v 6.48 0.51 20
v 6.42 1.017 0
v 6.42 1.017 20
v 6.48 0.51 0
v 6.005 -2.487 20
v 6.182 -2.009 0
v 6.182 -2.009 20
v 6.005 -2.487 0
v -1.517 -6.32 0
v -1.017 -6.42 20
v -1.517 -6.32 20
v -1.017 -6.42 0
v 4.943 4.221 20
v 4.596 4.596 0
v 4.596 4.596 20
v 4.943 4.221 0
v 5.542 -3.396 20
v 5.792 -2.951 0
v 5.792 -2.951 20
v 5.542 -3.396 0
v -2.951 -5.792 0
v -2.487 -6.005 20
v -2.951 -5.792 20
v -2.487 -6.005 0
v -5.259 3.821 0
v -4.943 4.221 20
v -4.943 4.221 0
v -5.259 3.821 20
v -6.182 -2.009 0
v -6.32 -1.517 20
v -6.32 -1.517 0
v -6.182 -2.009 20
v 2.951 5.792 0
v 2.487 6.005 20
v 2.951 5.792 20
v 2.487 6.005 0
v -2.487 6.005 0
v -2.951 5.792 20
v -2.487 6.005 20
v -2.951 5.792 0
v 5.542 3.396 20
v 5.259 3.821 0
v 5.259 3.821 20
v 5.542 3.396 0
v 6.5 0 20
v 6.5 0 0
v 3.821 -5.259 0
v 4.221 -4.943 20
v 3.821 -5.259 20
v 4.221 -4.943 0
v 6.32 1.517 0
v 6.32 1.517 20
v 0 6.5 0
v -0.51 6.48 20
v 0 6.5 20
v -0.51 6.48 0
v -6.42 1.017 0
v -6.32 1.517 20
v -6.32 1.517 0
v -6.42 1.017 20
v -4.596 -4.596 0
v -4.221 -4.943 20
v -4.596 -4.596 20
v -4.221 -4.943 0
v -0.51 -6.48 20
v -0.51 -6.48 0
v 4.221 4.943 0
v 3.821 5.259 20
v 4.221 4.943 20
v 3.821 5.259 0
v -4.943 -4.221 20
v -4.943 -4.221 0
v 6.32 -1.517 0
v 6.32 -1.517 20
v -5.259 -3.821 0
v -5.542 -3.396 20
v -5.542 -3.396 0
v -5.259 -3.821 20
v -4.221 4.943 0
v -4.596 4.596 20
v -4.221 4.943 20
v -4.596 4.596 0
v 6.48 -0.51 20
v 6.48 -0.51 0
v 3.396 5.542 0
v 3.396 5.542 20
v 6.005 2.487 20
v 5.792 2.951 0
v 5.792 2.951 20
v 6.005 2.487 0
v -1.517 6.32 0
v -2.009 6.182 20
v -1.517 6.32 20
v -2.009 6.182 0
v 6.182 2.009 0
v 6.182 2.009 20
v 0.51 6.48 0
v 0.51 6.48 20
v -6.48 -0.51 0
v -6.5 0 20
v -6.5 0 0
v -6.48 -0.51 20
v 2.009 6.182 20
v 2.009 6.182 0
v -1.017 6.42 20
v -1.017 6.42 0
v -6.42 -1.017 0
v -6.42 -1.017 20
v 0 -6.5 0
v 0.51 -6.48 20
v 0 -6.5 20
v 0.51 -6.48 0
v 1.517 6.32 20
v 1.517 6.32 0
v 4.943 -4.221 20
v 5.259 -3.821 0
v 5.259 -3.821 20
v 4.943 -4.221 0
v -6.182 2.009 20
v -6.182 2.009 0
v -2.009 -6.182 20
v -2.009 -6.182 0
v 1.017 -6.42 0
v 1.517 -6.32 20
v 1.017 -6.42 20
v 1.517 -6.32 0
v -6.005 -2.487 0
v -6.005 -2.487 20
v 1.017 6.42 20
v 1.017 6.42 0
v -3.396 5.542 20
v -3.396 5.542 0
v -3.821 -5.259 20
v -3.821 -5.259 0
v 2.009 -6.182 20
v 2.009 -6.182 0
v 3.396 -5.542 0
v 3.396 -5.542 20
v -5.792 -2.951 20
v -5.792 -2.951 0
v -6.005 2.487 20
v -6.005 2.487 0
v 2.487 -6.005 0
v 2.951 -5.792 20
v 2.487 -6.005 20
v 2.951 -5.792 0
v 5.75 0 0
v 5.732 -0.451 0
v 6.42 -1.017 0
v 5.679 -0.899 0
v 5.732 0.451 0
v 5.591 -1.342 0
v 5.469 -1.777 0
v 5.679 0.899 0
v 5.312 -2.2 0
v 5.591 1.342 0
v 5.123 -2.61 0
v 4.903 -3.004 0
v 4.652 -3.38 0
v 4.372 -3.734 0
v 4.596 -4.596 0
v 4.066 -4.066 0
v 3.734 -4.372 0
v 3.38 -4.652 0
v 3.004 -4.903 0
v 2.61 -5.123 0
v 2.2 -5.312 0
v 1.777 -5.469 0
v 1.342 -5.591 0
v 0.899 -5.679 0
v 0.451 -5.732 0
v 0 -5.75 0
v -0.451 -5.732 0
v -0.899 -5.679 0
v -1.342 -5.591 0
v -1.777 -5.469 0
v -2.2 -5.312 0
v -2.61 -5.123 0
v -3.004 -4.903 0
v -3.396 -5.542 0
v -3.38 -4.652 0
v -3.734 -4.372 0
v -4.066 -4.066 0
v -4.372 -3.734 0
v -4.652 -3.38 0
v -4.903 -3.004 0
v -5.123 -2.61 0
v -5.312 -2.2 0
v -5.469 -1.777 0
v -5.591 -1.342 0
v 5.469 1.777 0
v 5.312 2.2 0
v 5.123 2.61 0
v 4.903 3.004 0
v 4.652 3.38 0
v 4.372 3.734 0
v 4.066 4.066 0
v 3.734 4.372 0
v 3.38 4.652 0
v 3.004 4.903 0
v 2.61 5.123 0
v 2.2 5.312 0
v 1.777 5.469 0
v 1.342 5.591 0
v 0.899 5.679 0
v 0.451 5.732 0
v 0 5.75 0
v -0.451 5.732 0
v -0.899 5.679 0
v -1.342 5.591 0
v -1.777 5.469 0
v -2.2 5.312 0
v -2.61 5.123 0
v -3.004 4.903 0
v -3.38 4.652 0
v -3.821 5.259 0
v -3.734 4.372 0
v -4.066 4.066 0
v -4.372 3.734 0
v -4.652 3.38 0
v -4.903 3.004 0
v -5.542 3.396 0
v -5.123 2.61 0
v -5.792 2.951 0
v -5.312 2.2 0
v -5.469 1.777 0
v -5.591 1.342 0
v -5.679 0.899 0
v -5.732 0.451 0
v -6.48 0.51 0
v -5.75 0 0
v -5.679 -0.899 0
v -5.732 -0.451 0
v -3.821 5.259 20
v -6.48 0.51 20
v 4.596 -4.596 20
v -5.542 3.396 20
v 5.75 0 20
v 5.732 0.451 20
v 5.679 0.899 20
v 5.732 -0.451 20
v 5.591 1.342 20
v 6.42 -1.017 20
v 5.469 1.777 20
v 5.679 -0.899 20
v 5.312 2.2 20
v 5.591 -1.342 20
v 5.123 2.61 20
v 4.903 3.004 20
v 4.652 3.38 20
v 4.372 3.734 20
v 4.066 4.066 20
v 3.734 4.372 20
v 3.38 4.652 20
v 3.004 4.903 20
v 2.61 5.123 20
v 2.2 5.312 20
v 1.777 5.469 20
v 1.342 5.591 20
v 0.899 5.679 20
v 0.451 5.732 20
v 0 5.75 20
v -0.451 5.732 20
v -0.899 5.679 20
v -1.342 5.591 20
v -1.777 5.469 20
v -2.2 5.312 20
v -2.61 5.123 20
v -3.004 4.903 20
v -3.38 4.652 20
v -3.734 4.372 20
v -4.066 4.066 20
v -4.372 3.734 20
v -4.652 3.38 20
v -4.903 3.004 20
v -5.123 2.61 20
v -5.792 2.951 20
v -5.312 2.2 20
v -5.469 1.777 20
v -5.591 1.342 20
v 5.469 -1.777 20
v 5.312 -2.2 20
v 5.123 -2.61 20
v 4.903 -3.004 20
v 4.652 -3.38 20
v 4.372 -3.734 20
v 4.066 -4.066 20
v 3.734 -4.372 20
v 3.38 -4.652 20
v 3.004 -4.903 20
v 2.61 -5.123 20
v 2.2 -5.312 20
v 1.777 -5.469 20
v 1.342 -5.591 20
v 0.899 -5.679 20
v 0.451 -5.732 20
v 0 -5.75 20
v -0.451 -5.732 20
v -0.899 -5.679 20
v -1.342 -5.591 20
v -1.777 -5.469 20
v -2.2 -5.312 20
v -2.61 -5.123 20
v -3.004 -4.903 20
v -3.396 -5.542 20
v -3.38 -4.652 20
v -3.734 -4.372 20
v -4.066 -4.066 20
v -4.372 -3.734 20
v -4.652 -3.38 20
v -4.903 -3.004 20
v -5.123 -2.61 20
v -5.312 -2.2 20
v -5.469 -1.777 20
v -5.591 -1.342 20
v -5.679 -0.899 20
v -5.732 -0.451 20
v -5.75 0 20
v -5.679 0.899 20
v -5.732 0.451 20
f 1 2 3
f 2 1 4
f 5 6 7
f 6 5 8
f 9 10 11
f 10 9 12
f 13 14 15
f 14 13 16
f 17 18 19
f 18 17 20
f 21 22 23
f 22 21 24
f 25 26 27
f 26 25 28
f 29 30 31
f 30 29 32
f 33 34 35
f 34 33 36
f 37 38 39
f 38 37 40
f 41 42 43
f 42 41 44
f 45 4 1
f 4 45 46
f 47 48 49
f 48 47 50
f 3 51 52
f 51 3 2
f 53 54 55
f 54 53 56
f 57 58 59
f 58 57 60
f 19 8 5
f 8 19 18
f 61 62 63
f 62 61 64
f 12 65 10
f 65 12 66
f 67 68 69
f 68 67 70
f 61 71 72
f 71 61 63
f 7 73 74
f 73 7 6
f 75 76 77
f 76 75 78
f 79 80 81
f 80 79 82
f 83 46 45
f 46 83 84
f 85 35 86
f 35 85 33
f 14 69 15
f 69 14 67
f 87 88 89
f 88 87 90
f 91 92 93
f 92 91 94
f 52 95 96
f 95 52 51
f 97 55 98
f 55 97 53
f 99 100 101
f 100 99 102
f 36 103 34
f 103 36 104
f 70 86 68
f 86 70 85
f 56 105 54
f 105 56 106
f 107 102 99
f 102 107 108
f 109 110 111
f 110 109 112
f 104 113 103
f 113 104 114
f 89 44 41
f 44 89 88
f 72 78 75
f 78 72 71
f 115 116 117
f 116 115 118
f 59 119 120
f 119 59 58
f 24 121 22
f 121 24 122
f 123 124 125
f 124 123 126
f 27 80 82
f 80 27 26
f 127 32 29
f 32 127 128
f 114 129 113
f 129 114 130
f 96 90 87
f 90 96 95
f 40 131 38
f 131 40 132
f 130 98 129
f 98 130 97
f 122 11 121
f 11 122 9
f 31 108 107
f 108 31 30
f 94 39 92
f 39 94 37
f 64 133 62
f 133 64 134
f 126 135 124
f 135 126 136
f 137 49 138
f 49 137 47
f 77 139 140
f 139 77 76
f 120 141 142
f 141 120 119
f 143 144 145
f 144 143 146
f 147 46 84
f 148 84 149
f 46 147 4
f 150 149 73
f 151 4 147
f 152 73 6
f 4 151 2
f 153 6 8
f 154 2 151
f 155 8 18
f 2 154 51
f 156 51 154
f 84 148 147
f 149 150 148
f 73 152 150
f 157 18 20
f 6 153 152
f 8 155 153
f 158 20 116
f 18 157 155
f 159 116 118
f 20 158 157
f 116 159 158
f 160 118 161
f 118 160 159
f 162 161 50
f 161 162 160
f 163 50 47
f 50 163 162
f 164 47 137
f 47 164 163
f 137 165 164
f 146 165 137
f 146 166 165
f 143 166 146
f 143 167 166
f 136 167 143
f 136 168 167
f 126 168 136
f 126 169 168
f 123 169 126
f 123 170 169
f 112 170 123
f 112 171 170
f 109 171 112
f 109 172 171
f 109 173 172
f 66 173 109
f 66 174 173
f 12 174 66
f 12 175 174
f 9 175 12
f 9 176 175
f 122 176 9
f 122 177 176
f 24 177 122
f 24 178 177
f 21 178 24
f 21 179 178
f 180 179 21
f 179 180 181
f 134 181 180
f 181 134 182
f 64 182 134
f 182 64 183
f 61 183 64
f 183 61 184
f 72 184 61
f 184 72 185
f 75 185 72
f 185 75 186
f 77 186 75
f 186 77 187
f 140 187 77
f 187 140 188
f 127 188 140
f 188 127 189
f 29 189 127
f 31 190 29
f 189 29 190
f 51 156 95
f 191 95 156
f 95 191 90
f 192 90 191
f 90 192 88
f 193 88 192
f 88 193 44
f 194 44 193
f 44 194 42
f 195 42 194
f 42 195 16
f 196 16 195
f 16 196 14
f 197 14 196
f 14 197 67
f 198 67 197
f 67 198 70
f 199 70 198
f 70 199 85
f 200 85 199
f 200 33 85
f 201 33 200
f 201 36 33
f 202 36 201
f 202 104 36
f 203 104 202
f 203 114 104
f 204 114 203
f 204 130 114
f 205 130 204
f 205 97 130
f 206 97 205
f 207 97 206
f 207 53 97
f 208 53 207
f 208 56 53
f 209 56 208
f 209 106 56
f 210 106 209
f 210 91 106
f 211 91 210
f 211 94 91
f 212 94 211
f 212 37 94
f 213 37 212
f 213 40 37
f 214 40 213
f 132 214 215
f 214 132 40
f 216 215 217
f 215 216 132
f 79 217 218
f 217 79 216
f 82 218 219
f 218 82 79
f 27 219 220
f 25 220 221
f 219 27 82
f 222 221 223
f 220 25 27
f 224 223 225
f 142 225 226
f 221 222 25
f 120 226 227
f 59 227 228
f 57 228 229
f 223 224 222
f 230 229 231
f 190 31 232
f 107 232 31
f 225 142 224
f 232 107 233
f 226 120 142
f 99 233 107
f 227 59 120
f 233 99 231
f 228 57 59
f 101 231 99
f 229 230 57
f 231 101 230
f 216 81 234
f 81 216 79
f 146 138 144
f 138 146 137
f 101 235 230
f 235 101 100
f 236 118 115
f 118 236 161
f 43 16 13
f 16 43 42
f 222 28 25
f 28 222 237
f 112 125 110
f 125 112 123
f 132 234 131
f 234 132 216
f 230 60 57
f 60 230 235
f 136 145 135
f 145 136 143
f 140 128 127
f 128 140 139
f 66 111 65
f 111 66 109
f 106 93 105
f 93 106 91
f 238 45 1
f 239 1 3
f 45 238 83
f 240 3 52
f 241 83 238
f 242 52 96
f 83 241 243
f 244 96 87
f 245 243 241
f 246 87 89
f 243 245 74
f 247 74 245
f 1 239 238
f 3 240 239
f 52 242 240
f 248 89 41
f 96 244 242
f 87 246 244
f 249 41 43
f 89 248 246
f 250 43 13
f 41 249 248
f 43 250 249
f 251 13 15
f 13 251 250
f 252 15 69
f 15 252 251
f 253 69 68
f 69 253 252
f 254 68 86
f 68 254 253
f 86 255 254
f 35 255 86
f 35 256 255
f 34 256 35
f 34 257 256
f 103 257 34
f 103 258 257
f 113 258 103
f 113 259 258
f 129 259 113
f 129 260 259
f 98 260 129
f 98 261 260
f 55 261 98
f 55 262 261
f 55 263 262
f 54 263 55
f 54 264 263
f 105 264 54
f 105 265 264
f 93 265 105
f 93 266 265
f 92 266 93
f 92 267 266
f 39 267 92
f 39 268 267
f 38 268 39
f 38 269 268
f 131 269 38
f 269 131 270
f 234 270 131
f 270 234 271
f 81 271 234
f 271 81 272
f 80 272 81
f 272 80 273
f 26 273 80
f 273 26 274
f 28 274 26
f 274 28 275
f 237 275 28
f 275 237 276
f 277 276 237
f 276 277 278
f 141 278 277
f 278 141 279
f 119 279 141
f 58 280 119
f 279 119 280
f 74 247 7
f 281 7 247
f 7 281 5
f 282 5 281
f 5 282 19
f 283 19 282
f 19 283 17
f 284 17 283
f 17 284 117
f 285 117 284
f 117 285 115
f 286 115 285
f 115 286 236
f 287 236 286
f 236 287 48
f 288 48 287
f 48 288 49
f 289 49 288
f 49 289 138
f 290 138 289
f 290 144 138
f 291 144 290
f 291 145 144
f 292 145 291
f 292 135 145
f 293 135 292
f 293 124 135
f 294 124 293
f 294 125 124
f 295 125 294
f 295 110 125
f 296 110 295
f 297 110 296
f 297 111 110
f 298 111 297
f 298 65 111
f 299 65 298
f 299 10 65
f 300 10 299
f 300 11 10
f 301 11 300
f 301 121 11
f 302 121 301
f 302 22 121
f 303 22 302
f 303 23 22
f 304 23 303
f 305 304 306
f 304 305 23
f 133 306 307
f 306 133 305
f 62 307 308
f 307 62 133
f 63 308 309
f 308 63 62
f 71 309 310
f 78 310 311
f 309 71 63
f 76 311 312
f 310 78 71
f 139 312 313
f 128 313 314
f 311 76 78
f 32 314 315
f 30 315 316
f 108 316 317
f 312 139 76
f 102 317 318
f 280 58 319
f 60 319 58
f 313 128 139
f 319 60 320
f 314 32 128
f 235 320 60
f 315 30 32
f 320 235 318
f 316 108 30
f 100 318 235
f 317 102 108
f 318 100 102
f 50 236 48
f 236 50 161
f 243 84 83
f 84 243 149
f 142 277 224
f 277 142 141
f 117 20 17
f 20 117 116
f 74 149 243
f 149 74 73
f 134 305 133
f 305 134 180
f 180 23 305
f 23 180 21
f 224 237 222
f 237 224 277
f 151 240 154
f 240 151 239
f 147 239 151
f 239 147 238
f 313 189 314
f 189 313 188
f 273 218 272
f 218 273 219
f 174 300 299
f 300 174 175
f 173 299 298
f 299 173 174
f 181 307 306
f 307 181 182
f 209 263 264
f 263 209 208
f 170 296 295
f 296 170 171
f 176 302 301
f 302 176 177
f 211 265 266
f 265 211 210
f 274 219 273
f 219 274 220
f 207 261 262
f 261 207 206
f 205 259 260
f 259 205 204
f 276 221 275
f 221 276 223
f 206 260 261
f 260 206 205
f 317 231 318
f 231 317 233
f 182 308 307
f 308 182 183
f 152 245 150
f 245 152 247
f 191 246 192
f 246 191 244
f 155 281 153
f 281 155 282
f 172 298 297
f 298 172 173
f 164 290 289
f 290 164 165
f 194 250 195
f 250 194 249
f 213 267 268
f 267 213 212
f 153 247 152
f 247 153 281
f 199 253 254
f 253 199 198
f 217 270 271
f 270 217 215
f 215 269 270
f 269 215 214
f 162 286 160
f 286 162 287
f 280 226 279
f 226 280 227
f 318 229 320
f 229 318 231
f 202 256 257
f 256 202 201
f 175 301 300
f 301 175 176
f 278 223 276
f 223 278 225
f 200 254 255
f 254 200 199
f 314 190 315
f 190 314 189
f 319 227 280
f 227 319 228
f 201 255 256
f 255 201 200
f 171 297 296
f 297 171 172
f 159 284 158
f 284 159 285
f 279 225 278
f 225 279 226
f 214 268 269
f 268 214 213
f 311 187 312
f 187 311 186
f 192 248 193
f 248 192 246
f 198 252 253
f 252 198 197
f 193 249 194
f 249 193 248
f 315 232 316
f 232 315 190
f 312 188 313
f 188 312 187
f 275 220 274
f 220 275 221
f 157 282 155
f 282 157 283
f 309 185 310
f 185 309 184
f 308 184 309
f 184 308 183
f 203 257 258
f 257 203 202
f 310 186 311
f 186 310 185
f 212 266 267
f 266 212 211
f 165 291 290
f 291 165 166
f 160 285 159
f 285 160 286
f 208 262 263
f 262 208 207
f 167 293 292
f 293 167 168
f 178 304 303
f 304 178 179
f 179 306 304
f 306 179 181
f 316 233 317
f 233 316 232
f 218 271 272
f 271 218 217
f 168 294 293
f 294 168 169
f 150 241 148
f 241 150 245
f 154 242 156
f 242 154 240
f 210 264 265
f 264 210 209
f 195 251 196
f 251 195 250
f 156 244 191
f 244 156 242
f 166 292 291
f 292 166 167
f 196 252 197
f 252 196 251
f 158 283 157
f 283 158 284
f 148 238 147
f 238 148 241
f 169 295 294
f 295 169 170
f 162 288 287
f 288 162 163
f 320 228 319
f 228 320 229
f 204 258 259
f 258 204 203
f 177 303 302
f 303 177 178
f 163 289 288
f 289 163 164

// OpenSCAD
module longtube() {
    l = sqrt(250*250 + 210*210) -8;
    echo (l);

    rotate([0,0,-50]) difference() {
        intersection() {
            translate([0,0,1.7]) rotate([-90,0,0]) cylinder(d=4,h=l,$fn=20);
            translate([-5,0,0]) cube([10,l,10]);
        }
        cube([5,5,5]);
    }
    %cube([250,210,1]);
}

module tube_13_11_20() {
    difference() {
        cylinder(d=13,h=20,$fn=80);
        cylinder(d=11.5,h=20,$fn=80);
    }
}

//longtube();
tube_13_11_20();
